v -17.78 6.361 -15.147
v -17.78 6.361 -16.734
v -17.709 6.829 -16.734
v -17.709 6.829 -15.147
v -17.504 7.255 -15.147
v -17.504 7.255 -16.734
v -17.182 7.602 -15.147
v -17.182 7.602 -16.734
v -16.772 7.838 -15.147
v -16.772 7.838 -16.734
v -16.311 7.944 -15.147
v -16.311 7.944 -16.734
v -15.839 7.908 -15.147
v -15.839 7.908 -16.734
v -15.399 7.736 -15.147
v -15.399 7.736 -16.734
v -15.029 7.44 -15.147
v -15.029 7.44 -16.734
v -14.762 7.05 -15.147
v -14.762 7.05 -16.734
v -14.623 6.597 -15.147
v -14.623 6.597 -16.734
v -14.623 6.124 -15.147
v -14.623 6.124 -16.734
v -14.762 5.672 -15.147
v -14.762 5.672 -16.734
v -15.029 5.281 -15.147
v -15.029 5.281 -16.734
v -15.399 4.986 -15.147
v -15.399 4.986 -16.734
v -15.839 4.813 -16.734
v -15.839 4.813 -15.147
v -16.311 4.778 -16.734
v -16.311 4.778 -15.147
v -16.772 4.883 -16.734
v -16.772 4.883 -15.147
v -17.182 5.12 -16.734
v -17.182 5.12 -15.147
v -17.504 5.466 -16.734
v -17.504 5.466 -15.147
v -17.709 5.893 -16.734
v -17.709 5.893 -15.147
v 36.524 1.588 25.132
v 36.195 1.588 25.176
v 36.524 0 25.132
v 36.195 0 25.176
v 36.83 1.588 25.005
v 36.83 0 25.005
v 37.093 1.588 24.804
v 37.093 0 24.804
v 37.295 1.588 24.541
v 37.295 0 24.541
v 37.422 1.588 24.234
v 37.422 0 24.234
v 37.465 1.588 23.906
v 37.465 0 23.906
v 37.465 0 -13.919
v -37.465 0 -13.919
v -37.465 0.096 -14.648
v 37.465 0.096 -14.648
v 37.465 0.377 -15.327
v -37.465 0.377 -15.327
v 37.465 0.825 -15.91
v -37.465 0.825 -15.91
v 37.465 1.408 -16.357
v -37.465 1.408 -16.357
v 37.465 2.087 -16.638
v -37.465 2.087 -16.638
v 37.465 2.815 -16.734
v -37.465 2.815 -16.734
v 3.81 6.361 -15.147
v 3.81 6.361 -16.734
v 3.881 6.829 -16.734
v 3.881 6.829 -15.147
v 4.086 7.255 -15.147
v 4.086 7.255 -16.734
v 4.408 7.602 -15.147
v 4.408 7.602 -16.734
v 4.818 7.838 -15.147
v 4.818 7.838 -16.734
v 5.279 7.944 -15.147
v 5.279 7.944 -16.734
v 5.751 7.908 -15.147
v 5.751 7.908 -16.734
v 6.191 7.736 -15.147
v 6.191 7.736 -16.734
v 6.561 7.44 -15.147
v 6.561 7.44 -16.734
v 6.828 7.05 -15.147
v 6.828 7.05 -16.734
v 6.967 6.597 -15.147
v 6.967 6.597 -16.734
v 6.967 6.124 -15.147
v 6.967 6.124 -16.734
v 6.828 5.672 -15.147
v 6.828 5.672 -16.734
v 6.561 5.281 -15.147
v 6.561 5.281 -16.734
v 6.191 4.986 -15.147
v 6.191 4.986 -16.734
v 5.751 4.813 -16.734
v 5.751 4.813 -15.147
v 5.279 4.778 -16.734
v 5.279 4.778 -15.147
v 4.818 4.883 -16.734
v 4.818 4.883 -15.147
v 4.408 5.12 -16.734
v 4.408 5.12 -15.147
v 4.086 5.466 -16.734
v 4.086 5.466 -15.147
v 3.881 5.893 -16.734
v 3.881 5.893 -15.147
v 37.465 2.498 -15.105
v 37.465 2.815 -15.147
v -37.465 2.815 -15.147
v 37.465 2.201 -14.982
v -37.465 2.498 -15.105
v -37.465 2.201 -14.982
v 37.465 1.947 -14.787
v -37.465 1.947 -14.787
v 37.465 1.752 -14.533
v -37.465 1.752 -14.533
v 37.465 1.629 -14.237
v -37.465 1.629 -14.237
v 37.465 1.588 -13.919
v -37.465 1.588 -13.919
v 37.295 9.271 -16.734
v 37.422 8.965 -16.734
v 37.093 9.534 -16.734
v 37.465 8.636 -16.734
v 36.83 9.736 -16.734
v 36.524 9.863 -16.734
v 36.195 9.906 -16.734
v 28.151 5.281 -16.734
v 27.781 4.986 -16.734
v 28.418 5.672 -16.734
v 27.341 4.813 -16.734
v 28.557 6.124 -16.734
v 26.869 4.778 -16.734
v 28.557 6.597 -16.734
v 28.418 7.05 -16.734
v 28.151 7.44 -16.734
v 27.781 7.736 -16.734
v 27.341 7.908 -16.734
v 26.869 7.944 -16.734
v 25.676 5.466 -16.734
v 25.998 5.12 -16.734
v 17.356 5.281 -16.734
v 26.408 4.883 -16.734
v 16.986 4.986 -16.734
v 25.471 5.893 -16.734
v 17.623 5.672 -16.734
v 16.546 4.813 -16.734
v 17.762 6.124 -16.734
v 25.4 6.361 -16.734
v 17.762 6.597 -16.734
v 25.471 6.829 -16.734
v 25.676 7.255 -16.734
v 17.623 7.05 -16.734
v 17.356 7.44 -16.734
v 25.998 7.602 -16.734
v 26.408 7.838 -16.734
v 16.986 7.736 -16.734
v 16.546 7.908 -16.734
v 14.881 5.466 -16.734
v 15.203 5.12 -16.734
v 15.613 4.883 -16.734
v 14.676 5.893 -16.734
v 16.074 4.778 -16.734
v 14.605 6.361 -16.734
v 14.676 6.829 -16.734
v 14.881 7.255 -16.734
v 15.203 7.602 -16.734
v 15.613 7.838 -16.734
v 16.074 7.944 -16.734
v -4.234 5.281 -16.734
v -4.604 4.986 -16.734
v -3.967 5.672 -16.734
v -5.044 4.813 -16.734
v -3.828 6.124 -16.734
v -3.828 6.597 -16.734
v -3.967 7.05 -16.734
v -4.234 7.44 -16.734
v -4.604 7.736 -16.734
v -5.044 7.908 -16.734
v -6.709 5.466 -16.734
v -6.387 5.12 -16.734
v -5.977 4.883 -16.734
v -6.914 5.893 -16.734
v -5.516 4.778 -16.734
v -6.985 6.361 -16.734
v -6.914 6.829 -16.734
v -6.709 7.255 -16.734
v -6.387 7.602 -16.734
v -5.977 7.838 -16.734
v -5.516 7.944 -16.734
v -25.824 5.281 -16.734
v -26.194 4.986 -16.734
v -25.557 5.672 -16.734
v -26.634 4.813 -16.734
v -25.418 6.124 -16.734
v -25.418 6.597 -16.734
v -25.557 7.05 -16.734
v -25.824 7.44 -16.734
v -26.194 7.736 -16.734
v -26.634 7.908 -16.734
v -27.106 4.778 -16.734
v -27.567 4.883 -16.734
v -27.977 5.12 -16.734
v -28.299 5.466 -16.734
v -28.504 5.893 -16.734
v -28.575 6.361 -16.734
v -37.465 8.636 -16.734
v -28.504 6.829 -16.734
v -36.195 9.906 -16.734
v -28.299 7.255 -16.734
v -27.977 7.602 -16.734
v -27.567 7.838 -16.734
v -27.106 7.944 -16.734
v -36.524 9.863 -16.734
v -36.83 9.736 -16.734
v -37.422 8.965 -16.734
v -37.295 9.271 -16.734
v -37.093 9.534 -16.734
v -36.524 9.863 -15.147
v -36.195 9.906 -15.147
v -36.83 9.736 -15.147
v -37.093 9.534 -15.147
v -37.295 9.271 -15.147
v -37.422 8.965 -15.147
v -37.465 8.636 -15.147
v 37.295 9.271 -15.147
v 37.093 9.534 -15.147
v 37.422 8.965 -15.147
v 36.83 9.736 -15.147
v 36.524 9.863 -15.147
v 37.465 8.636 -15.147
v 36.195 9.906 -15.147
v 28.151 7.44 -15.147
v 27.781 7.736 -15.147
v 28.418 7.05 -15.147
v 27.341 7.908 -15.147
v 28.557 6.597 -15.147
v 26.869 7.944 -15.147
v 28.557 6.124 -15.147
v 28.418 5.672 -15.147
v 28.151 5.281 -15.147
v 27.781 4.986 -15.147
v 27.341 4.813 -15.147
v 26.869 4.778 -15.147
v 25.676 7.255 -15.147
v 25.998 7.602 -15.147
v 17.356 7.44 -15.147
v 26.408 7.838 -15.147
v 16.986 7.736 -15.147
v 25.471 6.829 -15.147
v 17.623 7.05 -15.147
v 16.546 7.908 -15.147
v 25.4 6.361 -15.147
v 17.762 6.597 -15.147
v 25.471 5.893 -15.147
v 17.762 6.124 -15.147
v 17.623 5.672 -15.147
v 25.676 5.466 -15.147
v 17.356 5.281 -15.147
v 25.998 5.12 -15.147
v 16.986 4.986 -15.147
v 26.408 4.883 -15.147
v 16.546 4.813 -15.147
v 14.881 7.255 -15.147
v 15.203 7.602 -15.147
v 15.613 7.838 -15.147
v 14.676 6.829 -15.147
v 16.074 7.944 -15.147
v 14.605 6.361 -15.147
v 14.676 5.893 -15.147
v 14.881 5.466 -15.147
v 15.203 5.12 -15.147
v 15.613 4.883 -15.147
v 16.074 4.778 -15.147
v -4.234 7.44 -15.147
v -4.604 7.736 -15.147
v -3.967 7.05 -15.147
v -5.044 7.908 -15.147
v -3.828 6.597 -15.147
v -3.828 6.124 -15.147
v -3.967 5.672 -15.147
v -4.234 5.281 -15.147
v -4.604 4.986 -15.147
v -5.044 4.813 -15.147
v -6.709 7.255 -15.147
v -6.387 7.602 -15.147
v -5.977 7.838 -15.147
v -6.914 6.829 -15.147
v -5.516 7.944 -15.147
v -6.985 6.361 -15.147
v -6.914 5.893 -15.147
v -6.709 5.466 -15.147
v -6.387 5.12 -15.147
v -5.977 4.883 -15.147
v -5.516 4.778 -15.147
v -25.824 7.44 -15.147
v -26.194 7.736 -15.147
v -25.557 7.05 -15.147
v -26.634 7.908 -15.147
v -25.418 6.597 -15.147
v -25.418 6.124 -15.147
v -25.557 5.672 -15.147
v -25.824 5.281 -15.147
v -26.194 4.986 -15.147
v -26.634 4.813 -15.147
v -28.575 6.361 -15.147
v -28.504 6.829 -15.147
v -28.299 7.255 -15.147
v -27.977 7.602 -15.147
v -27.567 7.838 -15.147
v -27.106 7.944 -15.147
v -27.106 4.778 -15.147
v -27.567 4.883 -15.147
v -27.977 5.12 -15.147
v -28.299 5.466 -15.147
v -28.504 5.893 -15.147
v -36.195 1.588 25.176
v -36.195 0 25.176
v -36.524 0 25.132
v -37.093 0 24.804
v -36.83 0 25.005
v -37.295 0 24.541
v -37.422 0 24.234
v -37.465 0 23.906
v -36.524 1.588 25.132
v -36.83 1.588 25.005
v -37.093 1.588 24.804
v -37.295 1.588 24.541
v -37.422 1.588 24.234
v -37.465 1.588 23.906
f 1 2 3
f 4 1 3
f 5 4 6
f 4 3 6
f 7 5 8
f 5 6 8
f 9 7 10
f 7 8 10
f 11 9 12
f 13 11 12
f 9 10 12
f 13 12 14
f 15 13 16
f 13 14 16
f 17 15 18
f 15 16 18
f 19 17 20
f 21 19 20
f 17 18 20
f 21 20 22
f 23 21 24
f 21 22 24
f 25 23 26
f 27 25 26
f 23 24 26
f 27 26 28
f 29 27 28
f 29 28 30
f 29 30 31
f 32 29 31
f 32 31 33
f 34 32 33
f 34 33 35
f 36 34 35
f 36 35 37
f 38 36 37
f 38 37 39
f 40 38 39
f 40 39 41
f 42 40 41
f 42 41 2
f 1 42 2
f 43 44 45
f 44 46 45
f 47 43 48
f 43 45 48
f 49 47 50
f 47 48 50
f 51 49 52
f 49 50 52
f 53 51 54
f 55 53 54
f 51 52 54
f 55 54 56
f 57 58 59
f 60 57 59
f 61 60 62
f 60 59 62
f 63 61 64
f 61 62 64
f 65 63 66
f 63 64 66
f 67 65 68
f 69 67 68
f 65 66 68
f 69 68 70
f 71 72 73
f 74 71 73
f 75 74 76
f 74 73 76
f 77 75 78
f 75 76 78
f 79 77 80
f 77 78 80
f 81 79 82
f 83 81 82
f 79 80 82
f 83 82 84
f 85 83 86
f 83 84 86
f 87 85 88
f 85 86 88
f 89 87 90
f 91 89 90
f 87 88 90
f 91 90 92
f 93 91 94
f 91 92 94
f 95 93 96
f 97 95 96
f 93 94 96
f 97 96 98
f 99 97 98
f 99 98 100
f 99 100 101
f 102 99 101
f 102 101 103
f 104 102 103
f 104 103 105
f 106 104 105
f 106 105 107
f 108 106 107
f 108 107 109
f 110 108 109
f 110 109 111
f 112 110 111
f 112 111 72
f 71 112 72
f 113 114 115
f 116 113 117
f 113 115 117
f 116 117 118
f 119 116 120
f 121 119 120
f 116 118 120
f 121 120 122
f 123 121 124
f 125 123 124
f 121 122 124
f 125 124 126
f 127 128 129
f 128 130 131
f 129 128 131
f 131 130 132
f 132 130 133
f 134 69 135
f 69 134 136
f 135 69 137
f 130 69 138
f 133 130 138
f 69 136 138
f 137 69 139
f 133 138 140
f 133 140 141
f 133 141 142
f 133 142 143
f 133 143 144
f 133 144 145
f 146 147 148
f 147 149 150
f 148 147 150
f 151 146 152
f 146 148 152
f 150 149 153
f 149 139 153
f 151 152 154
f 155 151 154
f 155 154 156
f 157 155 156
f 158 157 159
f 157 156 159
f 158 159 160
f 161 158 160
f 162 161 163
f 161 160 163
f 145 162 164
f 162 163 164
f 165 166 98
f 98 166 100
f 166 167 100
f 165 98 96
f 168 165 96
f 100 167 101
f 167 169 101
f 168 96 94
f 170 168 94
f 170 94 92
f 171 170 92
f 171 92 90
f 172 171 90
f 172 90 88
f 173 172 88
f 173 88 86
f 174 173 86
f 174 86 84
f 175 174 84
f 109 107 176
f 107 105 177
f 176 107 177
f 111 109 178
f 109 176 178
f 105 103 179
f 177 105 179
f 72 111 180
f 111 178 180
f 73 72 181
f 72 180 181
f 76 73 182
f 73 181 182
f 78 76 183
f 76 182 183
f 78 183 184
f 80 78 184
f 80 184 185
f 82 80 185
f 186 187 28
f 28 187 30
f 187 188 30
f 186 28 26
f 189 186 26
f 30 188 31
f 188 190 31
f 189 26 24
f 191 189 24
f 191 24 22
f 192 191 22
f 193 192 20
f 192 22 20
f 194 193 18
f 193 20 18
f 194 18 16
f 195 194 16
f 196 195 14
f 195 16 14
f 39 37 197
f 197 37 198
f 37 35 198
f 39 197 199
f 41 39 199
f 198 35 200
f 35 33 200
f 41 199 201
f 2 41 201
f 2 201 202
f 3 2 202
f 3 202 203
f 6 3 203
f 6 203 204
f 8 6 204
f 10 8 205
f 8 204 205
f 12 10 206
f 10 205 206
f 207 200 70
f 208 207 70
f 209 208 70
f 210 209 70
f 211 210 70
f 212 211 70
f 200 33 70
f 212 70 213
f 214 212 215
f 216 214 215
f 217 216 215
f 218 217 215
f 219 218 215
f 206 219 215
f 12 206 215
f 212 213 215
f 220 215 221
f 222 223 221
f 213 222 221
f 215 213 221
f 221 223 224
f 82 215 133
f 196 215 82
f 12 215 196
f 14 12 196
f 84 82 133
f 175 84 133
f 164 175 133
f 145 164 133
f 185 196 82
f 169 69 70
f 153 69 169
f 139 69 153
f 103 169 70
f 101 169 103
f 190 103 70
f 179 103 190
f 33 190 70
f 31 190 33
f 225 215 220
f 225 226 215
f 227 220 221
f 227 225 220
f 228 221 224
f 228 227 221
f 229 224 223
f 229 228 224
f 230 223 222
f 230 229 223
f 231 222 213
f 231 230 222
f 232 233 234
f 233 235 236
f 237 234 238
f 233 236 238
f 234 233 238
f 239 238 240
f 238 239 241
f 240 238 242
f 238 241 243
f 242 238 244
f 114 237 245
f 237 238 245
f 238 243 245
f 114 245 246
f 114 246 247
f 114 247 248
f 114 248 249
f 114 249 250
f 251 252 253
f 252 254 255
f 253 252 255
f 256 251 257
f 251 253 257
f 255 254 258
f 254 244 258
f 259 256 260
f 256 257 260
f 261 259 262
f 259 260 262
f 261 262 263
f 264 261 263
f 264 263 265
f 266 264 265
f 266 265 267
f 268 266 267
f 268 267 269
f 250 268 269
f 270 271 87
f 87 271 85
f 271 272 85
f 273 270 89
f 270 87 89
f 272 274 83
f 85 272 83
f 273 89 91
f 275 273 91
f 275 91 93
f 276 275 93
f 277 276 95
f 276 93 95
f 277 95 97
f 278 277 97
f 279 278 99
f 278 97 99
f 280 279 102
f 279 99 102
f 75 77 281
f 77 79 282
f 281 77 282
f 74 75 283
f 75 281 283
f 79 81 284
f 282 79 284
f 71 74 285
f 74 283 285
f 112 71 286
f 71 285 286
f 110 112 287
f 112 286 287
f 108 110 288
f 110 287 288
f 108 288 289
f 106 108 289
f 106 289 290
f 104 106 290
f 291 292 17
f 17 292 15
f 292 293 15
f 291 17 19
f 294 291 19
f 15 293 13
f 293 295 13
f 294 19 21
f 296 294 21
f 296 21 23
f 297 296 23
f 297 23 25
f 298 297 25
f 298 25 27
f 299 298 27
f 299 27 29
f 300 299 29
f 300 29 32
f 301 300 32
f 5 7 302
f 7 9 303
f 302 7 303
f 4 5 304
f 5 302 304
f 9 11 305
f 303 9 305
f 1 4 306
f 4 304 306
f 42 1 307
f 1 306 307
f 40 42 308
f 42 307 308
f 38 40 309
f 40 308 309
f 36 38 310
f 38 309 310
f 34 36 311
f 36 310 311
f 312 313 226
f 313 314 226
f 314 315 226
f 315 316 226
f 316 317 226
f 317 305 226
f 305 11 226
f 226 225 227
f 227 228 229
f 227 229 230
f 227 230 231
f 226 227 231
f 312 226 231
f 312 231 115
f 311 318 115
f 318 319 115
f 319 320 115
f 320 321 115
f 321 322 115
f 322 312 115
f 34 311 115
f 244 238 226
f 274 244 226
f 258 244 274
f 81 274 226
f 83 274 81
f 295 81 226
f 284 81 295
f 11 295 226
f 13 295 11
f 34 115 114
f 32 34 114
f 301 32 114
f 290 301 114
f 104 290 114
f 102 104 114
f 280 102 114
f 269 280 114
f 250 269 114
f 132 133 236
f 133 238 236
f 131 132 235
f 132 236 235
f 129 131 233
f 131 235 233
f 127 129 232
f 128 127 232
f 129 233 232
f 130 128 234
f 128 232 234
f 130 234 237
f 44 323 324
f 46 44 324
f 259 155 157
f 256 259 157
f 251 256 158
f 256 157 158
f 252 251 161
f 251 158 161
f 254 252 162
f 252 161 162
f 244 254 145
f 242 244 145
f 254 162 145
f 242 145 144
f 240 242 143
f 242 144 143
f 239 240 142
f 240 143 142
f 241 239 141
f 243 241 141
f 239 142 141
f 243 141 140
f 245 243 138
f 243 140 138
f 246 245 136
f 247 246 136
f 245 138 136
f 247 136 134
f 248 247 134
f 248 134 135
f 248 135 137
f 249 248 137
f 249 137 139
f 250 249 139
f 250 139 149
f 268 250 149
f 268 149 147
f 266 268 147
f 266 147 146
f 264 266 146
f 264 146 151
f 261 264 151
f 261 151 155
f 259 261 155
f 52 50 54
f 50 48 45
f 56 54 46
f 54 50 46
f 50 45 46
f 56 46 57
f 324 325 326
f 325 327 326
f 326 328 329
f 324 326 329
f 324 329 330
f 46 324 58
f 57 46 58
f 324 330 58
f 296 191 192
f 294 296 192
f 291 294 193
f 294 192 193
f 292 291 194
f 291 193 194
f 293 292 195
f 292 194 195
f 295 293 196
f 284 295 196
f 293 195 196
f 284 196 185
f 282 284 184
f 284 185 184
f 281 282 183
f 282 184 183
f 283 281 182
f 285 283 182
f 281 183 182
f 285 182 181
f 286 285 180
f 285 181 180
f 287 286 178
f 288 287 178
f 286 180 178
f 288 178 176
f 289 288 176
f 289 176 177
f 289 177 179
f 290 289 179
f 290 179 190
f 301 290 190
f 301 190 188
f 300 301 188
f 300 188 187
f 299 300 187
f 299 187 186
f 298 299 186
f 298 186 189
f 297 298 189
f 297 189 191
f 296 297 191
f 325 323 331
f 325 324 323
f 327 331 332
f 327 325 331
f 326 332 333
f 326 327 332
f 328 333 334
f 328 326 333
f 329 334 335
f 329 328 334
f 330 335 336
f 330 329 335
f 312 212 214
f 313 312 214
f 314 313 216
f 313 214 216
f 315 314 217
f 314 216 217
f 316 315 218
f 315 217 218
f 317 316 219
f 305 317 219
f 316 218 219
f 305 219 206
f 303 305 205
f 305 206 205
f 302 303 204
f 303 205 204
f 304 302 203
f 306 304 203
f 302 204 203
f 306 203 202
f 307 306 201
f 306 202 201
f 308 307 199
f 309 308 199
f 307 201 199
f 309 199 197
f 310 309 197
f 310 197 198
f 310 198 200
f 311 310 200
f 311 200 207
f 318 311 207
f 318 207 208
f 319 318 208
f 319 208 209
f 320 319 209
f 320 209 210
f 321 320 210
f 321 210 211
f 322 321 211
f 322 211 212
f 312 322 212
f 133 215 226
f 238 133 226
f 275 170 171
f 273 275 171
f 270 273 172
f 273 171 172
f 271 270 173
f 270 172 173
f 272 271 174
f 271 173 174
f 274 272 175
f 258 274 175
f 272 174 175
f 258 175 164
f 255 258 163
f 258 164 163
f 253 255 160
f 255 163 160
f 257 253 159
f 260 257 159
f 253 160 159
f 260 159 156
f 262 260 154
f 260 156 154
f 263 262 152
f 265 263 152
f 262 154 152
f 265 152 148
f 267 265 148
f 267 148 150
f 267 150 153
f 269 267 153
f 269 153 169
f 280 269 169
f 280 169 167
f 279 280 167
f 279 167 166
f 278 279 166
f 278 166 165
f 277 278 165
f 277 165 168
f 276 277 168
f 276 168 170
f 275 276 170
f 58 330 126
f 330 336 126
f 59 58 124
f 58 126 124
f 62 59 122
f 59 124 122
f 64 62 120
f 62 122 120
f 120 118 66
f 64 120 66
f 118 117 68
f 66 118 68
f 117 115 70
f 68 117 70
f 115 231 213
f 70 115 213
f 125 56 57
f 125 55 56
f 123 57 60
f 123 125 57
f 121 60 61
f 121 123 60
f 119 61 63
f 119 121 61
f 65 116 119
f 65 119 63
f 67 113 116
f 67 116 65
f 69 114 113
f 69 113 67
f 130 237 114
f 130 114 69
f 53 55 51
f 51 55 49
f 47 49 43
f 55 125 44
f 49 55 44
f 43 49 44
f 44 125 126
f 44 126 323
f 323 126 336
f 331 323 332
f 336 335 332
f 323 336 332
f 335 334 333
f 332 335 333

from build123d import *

# Parameters (mm, degrees)
BOSS_EXTRUDE1_DEPTH      = 37.465
BOSS_EXTRUDE1_DEPTH_BACK = 37.465
FILLET1_R                = 1.27
SKETCH2_R                = 1.5875
CUT_EXTRUDE1_DEPTH       = 58.080672394


with BuildPart() as part:
    # Sketch1 → Boss-Extrude1 (new, two sides: drawn at the far end of the back side and taken through both)
    with BuildSketch(Plane(origin=(0, 0, 0), x_dir=(0, 0, -1), z_dir=(1, 0, 0)).offset(-BOSS_EXTRUDE1_DEPTH_BACK)):
        with BuildLine():
            Line((-25.175589489, 0), (13.918974615, 0))
            ThreePointArc((13.918974615, 0), (15.909788429, 0.824622082), (16.734410511, 2.815435896))
            Line((16.734410511, 2.815435896), (16.734410511, 9.906))
            Line((16.734410511, 9.906), (15.146910511, 9.906))
            Line((15.146910511, 9.906), (15.146910511, 2.815435896))
            ThreePointArc((15.146910511, 2.815435896), (14.787256414, 1.947154097), (13.918974615, 1.5875))
            Line((13.918974615, 1.5875), (-25.175589489, 1.5875))
            Line((-25.175589489, 1.5875), (-25.175589489, 0))
        make_face()
    extrude(amount=BOSS_EXTRUDE1_DEPTH + BOSS_EXTRUDE1_DEPTH_BACK)

    # Fillet1
    fillet1_edges = [part.edges().sort_by_distance(p)[0] for p in [
        (-37.465, 9.906, -15.940660511),
        (37.465, 0.79375, 25.175589489),
        (37.465, 9.906, -15.940660511),
        (-37.465, 0.79375, 25.175589489),
    ]]
    fillet(fillet1_edges, radius=FILLET1_R)

    # Sketch2 → Cut-Extrude1 (cut, through all)
    with BuildSketch(Plane(origin=(0, 0, -16.734410511), x_dir=(-1, 0, 0), z_dir=(0, 0, -1))):
        with Locations((-26.9875, 6.360717948)):
            Circle(SKETCH2_R)
        with Locations((-16.1925, 6.360717948)):
            Circle(SKETCH2_R)
        with Locations((-5.3975, 6.360717948)):
            Circle(SKETCH2_R)
        with Locations((5.3975, 6.360717948)):
            Circle(SKETCH2_R)
        with Locations((16.1925, 6.360717948)):
            Circle(SKETCH2_R)
        with Locations((26.9875, 6.360717948)):
            Circle(SKETCH2_R)
    extrude(amount=-CUT_EXTRUDE1_DEPTH, mode=Mode.SUBTRACT)


solid = part.part
